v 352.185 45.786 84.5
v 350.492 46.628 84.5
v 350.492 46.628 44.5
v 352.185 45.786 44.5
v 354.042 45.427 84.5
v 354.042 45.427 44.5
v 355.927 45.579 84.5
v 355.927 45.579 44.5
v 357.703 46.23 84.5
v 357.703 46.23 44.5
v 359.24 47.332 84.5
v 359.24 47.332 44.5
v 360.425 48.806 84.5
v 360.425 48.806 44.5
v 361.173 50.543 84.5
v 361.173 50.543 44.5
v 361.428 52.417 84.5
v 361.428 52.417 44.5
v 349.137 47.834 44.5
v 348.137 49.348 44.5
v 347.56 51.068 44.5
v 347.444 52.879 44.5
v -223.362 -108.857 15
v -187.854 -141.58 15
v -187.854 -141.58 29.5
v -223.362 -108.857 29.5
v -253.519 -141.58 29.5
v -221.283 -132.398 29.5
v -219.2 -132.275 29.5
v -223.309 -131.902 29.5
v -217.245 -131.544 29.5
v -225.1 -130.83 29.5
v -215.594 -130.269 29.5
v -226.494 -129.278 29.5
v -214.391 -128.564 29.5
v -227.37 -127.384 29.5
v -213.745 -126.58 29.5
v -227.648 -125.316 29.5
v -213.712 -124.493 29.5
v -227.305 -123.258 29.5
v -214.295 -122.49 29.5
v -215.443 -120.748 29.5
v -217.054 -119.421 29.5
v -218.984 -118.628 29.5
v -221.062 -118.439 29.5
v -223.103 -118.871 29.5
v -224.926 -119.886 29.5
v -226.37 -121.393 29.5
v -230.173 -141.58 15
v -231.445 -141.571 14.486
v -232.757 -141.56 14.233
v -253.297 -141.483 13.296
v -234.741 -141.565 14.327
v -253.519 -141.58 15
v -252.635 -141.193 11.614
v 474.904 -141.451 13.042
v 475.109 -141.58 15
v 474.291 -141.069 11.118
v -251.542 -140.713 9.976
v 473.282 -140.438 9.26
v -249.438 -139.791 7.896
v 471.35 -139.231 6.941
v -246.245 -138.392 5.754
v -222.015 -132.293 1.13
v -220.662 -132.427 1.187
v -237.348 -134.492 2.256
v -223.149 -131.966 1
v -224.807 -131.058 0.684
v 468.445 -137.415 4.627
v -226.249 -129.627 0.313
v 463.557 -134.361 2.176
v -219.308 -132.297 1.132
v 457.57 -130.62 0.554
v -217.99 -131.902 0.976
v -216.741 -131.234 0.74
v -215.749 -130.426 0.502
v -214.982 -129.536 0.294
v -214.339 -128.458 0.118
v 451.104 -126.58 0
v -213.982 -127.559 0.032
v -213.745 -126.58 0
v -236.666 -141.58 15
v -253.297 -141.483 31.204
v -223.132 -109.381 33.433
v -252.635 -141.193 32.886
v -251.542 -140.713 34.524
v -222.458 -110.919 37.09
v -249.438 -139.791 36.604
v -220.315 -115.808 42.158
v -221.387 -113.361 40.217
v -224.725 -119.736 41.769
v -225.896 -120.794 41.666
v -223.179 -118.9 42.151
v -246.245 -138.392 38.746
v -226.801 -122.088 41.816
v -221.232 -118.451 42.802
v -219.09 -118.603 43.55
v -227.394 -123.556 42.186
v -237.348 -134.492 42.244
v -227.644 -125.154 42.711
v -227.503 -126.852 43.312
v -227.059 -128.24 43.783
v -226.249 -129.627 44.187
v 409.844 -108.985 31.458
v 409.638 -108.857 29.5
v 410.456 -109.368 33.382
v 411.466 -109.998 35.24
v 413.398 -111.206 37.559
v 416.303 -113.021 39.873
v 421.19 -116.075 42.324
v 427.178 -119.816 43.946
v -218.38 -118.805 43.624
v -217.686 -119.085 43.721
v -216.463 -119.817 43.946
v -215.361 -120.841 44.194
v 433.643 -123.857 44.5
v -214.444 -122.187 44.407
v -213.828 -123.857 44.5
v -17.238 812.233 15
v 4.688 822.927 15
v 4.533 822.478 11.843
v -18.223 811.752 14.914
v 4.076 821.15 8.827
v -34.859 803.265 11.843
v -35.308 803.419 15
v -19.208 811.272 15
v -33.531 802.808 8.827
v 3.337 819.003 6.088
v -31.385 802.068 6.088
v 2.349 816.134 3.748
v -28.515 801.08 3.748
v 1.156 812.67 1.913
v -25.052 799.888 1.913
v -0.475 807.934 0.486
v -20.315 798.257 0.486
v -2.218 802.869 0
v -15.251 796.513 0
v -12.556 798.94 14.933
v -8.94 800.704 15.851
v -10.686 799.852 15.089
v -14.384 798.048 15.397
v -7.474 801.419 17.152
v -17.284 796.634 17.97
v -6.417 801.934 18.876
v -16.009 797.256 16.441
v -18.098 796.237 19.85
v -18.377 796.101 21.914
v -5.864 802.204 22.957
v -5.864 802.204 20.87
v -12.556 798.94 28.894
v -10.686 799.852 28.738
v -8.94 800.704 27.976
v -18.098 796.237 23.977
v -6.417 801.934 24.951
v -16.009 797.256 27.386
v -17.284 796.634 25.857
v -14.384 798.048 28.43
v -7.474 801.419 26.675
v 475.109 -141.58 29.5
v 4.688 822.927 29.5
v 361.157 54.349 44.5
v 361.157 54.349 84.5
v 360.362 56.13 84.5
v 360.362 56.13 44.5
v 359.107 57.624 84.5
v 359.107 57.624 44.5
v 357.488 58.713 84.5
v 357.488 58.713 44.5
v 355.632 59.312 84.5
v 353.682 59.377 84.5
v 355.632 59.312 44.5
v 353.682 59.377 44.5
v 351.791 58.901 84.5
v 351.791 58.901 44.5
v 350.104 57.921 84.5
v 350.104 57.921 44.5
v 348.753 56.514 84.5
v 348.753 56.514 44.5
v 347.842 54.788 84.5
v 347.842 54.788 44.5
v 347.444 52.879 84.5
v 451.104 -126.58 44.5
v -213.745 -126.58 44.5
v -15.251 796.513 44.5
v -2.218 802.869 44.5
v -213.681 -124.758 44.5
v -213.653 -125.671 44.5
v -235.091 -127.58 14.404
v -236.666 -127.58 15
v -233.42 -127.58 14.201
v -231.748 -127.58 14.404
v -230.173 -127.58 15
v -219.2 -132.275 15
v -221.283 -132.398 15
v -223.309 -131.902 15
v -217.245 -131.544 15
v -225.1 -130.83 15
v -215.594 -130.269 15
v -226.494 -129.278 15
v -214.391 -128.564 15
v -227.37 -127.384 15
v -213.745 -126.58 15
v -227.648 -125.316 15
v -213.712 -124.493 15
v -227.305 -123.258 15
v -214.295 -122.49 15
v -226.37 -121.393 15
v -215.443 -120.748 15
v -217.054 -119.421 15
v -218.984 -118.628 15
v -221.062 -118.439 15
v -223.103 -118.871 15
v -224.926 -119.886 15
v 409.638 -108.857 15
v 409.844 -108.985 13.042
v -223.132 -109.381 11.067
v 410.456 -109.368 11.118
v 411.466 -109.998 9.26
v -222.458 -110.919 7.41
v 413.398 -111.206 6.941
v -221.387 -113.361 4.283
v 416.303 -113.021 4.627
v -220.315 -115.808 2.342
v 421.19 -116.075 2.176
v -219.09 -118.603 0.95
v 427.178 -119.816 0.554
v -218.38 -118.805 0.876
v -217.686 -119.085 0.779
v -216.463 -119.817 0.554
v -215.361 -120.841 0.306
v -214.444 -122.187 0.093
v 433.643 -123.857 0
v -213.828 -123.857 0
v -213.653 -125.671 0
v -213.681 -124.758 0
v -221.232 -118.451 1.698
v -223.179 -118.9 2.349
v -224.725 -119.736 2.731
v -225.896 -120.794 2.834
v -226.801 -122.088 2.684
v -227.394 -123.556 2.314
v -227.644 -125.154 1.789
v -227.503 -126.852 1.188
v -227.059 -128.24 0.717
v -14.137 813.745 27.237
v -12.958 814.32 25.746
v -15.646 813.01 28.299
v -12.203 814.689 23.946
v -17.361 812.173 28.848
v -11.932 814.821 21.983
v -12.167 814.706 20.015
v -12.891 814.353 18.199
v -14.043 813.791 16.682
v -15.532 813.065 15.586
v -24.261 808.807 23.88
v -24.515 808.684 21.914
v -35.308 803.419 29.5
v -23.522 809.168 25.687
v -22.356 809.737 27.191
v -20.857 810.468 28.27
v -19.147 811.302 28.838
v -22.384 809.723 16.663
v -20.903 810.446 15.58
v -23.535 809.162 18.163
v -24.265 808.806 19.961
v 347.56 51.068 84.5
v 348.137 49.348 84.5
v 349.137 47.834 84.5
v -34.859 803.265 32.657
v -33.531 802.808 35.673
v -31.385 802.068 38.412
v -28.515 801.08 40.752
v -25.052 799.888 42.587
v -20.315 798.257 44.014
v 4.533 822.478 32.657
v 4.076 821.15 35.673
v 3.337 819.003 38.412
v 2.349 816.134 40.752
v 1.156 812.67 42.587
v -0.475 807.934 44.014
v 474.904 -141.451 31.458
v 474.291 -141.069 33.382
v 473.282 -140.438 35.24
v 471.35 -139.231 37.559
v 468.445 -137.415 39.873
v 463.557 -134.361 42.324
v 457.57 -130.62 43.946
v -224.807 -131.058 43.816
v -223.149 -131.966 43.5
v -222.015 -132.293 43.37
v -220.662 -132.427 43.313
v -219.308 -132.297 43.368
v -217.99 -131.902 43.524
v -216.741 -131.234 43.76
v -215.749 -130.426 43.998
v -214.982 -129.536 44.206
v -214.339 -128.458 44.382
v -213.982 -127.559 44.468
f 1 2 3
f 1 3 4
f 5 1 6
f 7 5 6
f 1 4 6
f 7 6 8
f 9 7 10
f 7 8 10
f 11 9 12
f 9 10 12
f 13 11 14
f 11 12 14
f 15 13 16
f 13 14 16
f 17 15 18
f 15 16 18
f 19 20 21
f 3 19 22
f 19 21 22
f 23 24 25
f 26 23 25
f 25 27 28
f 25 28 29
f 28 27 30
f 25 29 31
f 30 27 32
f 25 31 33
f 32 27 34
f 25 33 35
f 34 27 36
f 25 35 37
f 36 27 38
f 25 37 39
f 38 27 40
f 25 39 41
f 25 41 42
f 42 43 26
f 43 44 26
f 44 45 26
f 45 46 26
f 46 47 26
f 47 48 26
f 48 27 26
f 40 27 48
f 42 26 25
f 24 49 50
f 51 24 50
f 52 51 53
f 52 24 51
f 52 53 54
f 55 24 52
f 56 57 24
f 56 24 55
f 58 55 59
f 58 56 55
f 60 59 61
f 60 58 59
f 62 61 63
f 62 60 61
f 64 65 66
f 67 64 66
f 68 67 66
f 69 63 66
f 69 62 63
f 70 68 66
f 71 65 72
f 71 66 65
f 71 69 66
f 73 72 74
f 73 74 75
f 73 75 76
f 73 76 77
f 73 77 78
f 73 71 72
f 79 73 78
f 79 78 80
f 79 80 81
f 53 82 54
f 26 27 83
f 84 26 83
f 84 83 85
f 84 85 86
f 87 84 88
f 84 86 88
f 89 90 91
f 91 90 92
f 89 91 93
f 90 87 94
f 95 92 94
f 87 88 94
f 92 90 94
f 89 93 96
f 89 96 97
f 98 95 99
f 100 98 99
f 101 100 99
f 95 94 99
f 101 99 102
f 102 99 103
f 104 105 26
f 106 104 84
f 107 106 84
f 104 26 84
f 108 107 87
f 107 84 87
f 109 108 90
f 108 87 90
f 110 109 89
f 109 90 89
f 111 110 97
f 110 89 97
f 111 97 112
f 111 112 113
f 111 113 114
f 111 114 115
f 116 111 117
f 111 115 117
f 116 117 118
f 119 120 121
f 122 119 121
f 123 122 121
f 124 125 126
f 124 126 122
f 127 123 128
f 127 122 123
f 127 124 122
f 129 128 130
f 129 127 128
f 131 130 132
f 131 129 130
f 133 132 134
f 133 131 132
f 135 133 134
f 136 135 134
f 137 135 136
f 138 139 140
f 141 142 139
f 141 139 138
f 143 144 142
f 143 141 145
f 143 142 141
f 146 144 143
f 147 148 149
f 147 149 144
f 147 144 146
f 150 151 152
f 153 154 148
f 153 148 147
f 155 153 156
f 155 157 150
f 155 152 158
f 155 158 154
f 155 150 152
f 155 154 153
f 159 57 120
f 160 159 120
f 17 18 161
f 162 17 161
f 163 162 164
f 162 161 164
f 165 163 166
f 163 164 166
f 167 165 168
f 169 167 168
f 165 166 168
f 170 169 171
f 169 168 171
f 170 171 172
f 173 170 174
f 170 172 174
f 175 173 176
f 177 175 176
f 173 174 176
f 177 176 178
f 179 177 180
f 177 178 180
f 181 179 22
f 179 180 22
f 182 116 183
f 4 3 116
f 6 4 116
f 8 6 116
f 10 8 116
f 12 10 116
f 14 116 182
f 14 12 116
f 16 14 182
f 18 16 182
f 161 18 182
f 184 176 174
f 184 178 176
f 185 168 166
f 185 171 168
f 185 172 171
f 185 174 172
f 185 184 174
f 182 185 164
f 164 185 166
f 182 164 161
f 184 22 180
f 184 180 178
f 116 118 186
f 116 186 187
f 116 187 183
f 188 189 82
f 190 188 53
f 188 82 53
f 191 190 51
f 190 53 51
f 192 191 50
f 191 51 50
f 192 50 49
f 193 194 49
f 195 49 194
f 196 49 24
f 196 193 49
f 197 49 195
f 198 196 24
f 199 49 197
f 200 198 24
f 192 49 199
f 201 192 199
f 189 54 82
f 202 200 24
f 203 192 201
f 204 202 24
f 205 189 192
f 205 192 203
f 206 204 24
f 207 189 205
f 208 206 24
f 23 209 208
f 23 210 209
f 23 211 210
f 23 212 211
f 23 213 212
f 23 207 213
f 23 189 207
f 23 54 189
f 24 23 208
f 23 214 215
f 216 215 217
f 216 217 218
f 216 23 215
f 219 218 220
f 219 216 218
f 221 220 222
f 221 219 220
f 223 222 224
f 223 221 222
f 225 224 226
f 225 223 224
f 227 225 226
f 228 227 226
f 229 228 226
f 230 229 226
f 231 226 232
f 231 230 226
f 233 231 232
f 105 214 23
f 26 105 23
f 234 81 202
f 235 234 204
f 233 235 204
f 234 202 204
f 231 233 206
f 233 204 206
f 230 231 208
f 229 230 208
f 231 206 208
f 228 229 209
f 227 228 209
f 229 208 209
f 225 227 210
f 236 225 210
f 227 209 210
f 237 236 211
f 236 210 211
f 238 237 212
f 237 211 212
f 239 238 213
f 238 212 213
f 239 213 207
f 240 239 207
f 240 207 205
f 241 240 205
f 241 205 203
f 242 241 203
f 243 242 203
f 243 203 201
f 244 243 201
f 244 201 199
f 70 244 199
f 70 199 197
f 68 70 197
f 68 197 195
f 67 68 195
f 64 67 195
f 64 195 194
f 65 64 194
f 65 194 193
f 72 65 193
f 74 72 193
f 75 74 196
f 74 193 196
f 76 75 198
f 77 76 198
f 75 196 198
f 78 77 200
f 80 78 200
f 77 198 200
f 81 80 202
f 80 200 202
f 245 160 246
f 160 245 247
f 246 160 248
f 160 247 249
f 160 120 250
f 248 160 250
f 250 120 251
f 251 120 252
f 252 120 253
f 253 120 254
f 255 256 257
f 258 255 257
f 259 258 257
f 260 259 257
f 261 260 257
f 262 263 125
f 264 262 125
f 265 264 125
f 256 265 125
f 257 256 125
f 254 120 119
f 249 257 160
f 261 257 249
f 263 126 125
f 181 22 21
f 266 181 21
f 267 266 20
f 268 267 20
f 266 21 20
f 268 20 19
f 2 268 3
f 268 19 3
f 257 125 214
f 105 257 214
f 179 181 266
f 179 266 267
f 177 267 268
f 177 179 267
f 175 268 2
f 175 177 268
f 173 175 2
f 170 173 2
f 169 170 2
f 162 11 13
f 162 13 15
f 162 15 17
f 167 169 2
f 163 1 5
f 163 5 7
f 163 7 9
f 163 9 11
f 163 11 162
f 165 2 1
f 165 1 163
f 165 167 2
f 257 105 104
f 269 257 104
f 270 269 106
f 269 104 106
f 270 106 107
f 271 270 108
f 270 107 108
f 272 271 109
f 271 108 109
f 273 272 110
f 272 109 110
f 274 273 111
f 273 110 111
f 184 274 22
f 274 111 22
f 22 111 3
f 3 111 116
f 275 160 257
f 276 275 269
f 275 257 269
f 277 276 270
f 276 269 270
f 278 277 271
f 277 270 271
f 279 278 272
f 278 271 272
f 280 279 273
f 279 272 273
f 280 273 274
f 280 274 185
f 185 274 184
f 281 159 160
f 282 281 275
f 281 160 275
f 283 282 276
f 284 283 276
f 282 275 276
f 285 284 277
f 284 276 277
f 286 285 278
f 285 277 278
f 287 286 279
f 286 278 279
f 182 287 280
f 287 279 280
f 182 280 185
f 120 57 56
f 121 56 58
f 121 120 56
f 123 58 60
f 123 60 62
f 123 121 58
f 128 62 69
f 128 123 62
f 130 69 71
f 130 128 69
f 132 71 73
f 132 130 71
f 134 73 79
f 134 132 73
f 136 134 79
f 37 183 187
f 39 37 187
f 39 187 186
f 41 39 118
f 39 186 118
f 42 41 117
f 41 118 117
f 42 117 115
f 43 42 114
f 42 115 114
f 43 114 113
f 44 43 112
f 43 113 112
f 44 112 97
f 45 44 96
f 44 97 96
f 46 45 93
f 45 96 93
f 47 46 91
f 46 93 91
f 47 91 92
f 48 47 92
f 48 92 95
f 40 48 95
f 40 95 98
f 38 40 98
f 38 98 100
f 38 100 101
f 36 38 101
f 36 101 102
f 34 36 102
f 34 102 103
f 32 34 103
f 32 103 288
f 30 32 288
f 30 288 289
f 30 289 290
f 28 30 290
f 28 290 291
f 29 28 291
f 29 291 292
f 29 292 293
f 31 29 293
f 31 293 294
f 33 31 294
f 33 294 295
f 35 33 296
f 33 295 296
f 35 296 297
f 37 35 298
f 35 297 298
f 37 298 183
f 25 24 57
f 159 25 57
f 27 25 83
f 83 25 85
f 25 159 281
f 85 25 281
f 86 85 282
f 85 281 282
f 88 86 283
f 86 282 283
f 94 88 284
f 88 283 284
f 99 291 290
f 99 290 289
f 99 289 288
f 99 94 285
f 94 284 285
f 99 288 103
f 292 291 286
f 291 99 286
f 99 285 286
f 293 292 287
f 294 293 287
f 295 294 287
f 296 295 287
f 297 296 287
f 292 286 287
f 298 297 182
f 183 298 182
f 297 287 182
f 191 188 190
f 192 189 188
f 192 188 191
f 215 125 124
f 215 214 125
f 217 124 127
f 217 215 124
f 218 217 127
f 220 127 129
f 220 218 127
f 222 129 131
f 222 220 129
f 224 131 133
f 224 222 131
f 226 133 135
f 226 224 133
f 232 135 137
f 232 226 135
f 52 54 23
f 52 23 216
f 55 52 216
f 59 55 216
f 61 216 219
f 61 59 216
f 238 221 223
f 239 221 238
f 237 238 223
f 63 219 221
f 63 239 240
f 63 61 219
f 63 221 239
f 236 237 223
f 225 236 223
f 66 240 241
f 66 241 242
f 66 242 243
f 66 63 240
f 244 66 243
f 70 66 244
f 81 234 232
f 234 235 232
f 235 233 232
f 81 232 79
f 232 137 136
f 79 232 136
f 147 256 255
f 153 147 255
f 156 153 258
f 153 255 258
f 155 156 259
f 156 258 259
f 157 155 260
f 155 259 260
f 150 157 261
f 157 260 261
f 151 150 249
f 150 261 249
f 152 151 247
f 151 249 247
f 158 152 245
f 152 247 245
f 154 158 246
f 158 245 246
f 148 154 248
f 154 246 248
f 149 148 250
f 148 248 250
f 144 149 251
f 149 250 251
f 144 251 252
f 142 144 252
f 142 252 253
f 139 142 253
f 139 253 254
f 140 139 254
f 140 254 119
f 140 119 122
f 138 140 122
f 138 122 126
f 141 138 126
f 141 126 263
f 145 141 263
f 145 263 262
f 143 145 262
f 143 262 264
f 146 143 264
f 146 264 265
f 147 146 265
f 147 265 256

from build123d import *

# Parameters (mm, degrees)
BOSS_EXTRUDE1_DEPTH = 44.5
FILLET2_R           = 15
SKETCH2_R           = 7
CUT_EXTRUDE1_DEPTH  = 14
SKETCH3_R           = 7
CUT_EXTRUDE2_DEPTH  = 14
SKETCH4_R           = 7
CUT_EXTRUDE3_DEPTH  = 14
SKETCH5_R           = 7
CUT_EXTRUDE4_DEPTH  = 952.271625519
SKETCH6_W           = 14.5
SKETCH6_H           = 44.5
CUT_EXTRUDE5_DEPTH  = 936.632574619
BOSS_EXTRUDE3_DEPTH = 40


with BuildPart() as part:
    # Sketch1 → Boss-Extrude1 (new body)
    with BuildSketch(Plane.XY):
        Polygon((-253.518736915, -141.579738071), (475.109189289, -141.579738071), (4.687860899, 822.926918688), (-35.308474161, 803.419402656), (409.63823983, -108.856554338), (-223.36176017, -108.856554338), align=None)
    extrude(amount=BOSS_EXTRUDE1_DEPTH)

    # Fillet2
    fillet2_edges = [part.edges().sort_by_distance(p)[0] for p in [
        (239.898525094, 340.673590309, 44.5),
        (-15.310306631, 813.173160672, 44.5),
        (187.164882834, 347.281424159, 44.5),
        (93.13823983, -108.856554338, 44.5),
        (-238.440248543, -125.218146204, 44.5),
        (93.13823983, -108.856554338, 0),
        (187.164882834, 347.281424159, 0),
        (-15.310306631, 813.173160672, 0),
        (239.898525094, 340.673590309, 0),
        (110.795226187, -141.579738071, 0),
        (-238.440248543, -125.218146204, 0),
        (110.795226187, -141.579738071, 44.5),
    ]]
    fillet(fillet2_edges, radius=FILLET2_R)

    # Sketch2 → Cut-Extrude1 (cut)
    with BuildSketch(Plane(origin=(-323.336767908, 662.938617367, 0), x_dir=(0.8987940462991654, 0.43837114678908073, 0), z_dir=(-0.43837114678908073, 0.8987940462991654, 0))):
        with Locations(Location((339.470196695, -21.913602874, 0), (0, 0, 180))):
            Circle(SKETCH2_R)
    extrude(amount=-CUT_EXTRUDE1_DEPTH, mode=Mode.SUBTRACT)

    # Sketch3 → Cut-Extrude2 (cut)
    with BuildSketch(Plane(origin=(-66.534083276, 61.316368798, 0), x_dir=(0, 0, 1), z_dir=(-0.735352443447444, 0.6776848706558778, 0))):
        with Locations(Location((22.366337019, -255.510068241, 0), (0, 0, 270))):
            Circle(SKETCH3_R)
    extrude(amount=-CUT_EXTRUDE2_DEPTH, mode=Mode.SUBTRACT)

    # Sketch4 → Cut-Extrude3 (cut)
    with BuildSketch(Plane(origin=(0, -141.579738071, 0), x_dir=(-1, 0, 0), z_dir=(0, -1, 0))):
        with Locations(Location((233.419507196, -21.201481555, 0), (0, 0, 117.634316404))):
            Circle(SKETCH4_R)
    extrude(amount=-CUT_EXTRUDE3_DEPTH, mode=Mode.SUBTRACT)

    # Sketch5 → Cut-Extrude4 (cut, through all)
    with BuildSketch(Plane.XY.offset(44.5)):
        with Locations(Location((-220.649115428, -125.427110978, 0), (0, 0, 350.522457382))):
            Circle(SKETCH5_R)
    extrude(amount=-CUT_EXTRUDE4_DEPTH, mode=Mode.SUBTRACT)

    # Sketch6 → Cut-Extrude5 (cut, through all)
    with BuildSketch(Plane(origin=(-66.534083276, 61.316368798, 0), x_dir=(0, 0, 1), z_dir=(-0.735352443447444, 0.6776848706558778, 0))):
        with Locations((22.25, -253.666818768)):
            Rectangle(SKETCH6_W, SKETCH6_H)
    extrude(amount=-CUT_EXTRUDE5_DEPTH, mode=Mode.SUBTRACT)

    # Sketch8 → Boss-Extrude3 (add)
    with BuildSketch(Plane.XY.offset(44.5)):
        with BuildLine():
            ThreePointArc((350.492241226, 46.628294304), (357.703100488, 46.229913436), (361.428471817, 52.416738718))
            ThreePointArc((361.428471817, 52.416738718), (354.659562876, 59.412923172), (347.443729839, 52.878668912))
            Line((347.443729839, 52.878668912), (350.492241226, 46.628294304))
        make_face()
        with BuildLine():
            Line((350.492241226, 46.628294304), (347.443729839, 52.878668912))
            ThreePointArc((347.443729839, 52.878668912), (348.136913493, 49.34814069), (350.492241226, 46.628294304))
        make_face()
    extrude(amount=BOSS_EXTRUDE3_DEPTH)


solid = part.part
